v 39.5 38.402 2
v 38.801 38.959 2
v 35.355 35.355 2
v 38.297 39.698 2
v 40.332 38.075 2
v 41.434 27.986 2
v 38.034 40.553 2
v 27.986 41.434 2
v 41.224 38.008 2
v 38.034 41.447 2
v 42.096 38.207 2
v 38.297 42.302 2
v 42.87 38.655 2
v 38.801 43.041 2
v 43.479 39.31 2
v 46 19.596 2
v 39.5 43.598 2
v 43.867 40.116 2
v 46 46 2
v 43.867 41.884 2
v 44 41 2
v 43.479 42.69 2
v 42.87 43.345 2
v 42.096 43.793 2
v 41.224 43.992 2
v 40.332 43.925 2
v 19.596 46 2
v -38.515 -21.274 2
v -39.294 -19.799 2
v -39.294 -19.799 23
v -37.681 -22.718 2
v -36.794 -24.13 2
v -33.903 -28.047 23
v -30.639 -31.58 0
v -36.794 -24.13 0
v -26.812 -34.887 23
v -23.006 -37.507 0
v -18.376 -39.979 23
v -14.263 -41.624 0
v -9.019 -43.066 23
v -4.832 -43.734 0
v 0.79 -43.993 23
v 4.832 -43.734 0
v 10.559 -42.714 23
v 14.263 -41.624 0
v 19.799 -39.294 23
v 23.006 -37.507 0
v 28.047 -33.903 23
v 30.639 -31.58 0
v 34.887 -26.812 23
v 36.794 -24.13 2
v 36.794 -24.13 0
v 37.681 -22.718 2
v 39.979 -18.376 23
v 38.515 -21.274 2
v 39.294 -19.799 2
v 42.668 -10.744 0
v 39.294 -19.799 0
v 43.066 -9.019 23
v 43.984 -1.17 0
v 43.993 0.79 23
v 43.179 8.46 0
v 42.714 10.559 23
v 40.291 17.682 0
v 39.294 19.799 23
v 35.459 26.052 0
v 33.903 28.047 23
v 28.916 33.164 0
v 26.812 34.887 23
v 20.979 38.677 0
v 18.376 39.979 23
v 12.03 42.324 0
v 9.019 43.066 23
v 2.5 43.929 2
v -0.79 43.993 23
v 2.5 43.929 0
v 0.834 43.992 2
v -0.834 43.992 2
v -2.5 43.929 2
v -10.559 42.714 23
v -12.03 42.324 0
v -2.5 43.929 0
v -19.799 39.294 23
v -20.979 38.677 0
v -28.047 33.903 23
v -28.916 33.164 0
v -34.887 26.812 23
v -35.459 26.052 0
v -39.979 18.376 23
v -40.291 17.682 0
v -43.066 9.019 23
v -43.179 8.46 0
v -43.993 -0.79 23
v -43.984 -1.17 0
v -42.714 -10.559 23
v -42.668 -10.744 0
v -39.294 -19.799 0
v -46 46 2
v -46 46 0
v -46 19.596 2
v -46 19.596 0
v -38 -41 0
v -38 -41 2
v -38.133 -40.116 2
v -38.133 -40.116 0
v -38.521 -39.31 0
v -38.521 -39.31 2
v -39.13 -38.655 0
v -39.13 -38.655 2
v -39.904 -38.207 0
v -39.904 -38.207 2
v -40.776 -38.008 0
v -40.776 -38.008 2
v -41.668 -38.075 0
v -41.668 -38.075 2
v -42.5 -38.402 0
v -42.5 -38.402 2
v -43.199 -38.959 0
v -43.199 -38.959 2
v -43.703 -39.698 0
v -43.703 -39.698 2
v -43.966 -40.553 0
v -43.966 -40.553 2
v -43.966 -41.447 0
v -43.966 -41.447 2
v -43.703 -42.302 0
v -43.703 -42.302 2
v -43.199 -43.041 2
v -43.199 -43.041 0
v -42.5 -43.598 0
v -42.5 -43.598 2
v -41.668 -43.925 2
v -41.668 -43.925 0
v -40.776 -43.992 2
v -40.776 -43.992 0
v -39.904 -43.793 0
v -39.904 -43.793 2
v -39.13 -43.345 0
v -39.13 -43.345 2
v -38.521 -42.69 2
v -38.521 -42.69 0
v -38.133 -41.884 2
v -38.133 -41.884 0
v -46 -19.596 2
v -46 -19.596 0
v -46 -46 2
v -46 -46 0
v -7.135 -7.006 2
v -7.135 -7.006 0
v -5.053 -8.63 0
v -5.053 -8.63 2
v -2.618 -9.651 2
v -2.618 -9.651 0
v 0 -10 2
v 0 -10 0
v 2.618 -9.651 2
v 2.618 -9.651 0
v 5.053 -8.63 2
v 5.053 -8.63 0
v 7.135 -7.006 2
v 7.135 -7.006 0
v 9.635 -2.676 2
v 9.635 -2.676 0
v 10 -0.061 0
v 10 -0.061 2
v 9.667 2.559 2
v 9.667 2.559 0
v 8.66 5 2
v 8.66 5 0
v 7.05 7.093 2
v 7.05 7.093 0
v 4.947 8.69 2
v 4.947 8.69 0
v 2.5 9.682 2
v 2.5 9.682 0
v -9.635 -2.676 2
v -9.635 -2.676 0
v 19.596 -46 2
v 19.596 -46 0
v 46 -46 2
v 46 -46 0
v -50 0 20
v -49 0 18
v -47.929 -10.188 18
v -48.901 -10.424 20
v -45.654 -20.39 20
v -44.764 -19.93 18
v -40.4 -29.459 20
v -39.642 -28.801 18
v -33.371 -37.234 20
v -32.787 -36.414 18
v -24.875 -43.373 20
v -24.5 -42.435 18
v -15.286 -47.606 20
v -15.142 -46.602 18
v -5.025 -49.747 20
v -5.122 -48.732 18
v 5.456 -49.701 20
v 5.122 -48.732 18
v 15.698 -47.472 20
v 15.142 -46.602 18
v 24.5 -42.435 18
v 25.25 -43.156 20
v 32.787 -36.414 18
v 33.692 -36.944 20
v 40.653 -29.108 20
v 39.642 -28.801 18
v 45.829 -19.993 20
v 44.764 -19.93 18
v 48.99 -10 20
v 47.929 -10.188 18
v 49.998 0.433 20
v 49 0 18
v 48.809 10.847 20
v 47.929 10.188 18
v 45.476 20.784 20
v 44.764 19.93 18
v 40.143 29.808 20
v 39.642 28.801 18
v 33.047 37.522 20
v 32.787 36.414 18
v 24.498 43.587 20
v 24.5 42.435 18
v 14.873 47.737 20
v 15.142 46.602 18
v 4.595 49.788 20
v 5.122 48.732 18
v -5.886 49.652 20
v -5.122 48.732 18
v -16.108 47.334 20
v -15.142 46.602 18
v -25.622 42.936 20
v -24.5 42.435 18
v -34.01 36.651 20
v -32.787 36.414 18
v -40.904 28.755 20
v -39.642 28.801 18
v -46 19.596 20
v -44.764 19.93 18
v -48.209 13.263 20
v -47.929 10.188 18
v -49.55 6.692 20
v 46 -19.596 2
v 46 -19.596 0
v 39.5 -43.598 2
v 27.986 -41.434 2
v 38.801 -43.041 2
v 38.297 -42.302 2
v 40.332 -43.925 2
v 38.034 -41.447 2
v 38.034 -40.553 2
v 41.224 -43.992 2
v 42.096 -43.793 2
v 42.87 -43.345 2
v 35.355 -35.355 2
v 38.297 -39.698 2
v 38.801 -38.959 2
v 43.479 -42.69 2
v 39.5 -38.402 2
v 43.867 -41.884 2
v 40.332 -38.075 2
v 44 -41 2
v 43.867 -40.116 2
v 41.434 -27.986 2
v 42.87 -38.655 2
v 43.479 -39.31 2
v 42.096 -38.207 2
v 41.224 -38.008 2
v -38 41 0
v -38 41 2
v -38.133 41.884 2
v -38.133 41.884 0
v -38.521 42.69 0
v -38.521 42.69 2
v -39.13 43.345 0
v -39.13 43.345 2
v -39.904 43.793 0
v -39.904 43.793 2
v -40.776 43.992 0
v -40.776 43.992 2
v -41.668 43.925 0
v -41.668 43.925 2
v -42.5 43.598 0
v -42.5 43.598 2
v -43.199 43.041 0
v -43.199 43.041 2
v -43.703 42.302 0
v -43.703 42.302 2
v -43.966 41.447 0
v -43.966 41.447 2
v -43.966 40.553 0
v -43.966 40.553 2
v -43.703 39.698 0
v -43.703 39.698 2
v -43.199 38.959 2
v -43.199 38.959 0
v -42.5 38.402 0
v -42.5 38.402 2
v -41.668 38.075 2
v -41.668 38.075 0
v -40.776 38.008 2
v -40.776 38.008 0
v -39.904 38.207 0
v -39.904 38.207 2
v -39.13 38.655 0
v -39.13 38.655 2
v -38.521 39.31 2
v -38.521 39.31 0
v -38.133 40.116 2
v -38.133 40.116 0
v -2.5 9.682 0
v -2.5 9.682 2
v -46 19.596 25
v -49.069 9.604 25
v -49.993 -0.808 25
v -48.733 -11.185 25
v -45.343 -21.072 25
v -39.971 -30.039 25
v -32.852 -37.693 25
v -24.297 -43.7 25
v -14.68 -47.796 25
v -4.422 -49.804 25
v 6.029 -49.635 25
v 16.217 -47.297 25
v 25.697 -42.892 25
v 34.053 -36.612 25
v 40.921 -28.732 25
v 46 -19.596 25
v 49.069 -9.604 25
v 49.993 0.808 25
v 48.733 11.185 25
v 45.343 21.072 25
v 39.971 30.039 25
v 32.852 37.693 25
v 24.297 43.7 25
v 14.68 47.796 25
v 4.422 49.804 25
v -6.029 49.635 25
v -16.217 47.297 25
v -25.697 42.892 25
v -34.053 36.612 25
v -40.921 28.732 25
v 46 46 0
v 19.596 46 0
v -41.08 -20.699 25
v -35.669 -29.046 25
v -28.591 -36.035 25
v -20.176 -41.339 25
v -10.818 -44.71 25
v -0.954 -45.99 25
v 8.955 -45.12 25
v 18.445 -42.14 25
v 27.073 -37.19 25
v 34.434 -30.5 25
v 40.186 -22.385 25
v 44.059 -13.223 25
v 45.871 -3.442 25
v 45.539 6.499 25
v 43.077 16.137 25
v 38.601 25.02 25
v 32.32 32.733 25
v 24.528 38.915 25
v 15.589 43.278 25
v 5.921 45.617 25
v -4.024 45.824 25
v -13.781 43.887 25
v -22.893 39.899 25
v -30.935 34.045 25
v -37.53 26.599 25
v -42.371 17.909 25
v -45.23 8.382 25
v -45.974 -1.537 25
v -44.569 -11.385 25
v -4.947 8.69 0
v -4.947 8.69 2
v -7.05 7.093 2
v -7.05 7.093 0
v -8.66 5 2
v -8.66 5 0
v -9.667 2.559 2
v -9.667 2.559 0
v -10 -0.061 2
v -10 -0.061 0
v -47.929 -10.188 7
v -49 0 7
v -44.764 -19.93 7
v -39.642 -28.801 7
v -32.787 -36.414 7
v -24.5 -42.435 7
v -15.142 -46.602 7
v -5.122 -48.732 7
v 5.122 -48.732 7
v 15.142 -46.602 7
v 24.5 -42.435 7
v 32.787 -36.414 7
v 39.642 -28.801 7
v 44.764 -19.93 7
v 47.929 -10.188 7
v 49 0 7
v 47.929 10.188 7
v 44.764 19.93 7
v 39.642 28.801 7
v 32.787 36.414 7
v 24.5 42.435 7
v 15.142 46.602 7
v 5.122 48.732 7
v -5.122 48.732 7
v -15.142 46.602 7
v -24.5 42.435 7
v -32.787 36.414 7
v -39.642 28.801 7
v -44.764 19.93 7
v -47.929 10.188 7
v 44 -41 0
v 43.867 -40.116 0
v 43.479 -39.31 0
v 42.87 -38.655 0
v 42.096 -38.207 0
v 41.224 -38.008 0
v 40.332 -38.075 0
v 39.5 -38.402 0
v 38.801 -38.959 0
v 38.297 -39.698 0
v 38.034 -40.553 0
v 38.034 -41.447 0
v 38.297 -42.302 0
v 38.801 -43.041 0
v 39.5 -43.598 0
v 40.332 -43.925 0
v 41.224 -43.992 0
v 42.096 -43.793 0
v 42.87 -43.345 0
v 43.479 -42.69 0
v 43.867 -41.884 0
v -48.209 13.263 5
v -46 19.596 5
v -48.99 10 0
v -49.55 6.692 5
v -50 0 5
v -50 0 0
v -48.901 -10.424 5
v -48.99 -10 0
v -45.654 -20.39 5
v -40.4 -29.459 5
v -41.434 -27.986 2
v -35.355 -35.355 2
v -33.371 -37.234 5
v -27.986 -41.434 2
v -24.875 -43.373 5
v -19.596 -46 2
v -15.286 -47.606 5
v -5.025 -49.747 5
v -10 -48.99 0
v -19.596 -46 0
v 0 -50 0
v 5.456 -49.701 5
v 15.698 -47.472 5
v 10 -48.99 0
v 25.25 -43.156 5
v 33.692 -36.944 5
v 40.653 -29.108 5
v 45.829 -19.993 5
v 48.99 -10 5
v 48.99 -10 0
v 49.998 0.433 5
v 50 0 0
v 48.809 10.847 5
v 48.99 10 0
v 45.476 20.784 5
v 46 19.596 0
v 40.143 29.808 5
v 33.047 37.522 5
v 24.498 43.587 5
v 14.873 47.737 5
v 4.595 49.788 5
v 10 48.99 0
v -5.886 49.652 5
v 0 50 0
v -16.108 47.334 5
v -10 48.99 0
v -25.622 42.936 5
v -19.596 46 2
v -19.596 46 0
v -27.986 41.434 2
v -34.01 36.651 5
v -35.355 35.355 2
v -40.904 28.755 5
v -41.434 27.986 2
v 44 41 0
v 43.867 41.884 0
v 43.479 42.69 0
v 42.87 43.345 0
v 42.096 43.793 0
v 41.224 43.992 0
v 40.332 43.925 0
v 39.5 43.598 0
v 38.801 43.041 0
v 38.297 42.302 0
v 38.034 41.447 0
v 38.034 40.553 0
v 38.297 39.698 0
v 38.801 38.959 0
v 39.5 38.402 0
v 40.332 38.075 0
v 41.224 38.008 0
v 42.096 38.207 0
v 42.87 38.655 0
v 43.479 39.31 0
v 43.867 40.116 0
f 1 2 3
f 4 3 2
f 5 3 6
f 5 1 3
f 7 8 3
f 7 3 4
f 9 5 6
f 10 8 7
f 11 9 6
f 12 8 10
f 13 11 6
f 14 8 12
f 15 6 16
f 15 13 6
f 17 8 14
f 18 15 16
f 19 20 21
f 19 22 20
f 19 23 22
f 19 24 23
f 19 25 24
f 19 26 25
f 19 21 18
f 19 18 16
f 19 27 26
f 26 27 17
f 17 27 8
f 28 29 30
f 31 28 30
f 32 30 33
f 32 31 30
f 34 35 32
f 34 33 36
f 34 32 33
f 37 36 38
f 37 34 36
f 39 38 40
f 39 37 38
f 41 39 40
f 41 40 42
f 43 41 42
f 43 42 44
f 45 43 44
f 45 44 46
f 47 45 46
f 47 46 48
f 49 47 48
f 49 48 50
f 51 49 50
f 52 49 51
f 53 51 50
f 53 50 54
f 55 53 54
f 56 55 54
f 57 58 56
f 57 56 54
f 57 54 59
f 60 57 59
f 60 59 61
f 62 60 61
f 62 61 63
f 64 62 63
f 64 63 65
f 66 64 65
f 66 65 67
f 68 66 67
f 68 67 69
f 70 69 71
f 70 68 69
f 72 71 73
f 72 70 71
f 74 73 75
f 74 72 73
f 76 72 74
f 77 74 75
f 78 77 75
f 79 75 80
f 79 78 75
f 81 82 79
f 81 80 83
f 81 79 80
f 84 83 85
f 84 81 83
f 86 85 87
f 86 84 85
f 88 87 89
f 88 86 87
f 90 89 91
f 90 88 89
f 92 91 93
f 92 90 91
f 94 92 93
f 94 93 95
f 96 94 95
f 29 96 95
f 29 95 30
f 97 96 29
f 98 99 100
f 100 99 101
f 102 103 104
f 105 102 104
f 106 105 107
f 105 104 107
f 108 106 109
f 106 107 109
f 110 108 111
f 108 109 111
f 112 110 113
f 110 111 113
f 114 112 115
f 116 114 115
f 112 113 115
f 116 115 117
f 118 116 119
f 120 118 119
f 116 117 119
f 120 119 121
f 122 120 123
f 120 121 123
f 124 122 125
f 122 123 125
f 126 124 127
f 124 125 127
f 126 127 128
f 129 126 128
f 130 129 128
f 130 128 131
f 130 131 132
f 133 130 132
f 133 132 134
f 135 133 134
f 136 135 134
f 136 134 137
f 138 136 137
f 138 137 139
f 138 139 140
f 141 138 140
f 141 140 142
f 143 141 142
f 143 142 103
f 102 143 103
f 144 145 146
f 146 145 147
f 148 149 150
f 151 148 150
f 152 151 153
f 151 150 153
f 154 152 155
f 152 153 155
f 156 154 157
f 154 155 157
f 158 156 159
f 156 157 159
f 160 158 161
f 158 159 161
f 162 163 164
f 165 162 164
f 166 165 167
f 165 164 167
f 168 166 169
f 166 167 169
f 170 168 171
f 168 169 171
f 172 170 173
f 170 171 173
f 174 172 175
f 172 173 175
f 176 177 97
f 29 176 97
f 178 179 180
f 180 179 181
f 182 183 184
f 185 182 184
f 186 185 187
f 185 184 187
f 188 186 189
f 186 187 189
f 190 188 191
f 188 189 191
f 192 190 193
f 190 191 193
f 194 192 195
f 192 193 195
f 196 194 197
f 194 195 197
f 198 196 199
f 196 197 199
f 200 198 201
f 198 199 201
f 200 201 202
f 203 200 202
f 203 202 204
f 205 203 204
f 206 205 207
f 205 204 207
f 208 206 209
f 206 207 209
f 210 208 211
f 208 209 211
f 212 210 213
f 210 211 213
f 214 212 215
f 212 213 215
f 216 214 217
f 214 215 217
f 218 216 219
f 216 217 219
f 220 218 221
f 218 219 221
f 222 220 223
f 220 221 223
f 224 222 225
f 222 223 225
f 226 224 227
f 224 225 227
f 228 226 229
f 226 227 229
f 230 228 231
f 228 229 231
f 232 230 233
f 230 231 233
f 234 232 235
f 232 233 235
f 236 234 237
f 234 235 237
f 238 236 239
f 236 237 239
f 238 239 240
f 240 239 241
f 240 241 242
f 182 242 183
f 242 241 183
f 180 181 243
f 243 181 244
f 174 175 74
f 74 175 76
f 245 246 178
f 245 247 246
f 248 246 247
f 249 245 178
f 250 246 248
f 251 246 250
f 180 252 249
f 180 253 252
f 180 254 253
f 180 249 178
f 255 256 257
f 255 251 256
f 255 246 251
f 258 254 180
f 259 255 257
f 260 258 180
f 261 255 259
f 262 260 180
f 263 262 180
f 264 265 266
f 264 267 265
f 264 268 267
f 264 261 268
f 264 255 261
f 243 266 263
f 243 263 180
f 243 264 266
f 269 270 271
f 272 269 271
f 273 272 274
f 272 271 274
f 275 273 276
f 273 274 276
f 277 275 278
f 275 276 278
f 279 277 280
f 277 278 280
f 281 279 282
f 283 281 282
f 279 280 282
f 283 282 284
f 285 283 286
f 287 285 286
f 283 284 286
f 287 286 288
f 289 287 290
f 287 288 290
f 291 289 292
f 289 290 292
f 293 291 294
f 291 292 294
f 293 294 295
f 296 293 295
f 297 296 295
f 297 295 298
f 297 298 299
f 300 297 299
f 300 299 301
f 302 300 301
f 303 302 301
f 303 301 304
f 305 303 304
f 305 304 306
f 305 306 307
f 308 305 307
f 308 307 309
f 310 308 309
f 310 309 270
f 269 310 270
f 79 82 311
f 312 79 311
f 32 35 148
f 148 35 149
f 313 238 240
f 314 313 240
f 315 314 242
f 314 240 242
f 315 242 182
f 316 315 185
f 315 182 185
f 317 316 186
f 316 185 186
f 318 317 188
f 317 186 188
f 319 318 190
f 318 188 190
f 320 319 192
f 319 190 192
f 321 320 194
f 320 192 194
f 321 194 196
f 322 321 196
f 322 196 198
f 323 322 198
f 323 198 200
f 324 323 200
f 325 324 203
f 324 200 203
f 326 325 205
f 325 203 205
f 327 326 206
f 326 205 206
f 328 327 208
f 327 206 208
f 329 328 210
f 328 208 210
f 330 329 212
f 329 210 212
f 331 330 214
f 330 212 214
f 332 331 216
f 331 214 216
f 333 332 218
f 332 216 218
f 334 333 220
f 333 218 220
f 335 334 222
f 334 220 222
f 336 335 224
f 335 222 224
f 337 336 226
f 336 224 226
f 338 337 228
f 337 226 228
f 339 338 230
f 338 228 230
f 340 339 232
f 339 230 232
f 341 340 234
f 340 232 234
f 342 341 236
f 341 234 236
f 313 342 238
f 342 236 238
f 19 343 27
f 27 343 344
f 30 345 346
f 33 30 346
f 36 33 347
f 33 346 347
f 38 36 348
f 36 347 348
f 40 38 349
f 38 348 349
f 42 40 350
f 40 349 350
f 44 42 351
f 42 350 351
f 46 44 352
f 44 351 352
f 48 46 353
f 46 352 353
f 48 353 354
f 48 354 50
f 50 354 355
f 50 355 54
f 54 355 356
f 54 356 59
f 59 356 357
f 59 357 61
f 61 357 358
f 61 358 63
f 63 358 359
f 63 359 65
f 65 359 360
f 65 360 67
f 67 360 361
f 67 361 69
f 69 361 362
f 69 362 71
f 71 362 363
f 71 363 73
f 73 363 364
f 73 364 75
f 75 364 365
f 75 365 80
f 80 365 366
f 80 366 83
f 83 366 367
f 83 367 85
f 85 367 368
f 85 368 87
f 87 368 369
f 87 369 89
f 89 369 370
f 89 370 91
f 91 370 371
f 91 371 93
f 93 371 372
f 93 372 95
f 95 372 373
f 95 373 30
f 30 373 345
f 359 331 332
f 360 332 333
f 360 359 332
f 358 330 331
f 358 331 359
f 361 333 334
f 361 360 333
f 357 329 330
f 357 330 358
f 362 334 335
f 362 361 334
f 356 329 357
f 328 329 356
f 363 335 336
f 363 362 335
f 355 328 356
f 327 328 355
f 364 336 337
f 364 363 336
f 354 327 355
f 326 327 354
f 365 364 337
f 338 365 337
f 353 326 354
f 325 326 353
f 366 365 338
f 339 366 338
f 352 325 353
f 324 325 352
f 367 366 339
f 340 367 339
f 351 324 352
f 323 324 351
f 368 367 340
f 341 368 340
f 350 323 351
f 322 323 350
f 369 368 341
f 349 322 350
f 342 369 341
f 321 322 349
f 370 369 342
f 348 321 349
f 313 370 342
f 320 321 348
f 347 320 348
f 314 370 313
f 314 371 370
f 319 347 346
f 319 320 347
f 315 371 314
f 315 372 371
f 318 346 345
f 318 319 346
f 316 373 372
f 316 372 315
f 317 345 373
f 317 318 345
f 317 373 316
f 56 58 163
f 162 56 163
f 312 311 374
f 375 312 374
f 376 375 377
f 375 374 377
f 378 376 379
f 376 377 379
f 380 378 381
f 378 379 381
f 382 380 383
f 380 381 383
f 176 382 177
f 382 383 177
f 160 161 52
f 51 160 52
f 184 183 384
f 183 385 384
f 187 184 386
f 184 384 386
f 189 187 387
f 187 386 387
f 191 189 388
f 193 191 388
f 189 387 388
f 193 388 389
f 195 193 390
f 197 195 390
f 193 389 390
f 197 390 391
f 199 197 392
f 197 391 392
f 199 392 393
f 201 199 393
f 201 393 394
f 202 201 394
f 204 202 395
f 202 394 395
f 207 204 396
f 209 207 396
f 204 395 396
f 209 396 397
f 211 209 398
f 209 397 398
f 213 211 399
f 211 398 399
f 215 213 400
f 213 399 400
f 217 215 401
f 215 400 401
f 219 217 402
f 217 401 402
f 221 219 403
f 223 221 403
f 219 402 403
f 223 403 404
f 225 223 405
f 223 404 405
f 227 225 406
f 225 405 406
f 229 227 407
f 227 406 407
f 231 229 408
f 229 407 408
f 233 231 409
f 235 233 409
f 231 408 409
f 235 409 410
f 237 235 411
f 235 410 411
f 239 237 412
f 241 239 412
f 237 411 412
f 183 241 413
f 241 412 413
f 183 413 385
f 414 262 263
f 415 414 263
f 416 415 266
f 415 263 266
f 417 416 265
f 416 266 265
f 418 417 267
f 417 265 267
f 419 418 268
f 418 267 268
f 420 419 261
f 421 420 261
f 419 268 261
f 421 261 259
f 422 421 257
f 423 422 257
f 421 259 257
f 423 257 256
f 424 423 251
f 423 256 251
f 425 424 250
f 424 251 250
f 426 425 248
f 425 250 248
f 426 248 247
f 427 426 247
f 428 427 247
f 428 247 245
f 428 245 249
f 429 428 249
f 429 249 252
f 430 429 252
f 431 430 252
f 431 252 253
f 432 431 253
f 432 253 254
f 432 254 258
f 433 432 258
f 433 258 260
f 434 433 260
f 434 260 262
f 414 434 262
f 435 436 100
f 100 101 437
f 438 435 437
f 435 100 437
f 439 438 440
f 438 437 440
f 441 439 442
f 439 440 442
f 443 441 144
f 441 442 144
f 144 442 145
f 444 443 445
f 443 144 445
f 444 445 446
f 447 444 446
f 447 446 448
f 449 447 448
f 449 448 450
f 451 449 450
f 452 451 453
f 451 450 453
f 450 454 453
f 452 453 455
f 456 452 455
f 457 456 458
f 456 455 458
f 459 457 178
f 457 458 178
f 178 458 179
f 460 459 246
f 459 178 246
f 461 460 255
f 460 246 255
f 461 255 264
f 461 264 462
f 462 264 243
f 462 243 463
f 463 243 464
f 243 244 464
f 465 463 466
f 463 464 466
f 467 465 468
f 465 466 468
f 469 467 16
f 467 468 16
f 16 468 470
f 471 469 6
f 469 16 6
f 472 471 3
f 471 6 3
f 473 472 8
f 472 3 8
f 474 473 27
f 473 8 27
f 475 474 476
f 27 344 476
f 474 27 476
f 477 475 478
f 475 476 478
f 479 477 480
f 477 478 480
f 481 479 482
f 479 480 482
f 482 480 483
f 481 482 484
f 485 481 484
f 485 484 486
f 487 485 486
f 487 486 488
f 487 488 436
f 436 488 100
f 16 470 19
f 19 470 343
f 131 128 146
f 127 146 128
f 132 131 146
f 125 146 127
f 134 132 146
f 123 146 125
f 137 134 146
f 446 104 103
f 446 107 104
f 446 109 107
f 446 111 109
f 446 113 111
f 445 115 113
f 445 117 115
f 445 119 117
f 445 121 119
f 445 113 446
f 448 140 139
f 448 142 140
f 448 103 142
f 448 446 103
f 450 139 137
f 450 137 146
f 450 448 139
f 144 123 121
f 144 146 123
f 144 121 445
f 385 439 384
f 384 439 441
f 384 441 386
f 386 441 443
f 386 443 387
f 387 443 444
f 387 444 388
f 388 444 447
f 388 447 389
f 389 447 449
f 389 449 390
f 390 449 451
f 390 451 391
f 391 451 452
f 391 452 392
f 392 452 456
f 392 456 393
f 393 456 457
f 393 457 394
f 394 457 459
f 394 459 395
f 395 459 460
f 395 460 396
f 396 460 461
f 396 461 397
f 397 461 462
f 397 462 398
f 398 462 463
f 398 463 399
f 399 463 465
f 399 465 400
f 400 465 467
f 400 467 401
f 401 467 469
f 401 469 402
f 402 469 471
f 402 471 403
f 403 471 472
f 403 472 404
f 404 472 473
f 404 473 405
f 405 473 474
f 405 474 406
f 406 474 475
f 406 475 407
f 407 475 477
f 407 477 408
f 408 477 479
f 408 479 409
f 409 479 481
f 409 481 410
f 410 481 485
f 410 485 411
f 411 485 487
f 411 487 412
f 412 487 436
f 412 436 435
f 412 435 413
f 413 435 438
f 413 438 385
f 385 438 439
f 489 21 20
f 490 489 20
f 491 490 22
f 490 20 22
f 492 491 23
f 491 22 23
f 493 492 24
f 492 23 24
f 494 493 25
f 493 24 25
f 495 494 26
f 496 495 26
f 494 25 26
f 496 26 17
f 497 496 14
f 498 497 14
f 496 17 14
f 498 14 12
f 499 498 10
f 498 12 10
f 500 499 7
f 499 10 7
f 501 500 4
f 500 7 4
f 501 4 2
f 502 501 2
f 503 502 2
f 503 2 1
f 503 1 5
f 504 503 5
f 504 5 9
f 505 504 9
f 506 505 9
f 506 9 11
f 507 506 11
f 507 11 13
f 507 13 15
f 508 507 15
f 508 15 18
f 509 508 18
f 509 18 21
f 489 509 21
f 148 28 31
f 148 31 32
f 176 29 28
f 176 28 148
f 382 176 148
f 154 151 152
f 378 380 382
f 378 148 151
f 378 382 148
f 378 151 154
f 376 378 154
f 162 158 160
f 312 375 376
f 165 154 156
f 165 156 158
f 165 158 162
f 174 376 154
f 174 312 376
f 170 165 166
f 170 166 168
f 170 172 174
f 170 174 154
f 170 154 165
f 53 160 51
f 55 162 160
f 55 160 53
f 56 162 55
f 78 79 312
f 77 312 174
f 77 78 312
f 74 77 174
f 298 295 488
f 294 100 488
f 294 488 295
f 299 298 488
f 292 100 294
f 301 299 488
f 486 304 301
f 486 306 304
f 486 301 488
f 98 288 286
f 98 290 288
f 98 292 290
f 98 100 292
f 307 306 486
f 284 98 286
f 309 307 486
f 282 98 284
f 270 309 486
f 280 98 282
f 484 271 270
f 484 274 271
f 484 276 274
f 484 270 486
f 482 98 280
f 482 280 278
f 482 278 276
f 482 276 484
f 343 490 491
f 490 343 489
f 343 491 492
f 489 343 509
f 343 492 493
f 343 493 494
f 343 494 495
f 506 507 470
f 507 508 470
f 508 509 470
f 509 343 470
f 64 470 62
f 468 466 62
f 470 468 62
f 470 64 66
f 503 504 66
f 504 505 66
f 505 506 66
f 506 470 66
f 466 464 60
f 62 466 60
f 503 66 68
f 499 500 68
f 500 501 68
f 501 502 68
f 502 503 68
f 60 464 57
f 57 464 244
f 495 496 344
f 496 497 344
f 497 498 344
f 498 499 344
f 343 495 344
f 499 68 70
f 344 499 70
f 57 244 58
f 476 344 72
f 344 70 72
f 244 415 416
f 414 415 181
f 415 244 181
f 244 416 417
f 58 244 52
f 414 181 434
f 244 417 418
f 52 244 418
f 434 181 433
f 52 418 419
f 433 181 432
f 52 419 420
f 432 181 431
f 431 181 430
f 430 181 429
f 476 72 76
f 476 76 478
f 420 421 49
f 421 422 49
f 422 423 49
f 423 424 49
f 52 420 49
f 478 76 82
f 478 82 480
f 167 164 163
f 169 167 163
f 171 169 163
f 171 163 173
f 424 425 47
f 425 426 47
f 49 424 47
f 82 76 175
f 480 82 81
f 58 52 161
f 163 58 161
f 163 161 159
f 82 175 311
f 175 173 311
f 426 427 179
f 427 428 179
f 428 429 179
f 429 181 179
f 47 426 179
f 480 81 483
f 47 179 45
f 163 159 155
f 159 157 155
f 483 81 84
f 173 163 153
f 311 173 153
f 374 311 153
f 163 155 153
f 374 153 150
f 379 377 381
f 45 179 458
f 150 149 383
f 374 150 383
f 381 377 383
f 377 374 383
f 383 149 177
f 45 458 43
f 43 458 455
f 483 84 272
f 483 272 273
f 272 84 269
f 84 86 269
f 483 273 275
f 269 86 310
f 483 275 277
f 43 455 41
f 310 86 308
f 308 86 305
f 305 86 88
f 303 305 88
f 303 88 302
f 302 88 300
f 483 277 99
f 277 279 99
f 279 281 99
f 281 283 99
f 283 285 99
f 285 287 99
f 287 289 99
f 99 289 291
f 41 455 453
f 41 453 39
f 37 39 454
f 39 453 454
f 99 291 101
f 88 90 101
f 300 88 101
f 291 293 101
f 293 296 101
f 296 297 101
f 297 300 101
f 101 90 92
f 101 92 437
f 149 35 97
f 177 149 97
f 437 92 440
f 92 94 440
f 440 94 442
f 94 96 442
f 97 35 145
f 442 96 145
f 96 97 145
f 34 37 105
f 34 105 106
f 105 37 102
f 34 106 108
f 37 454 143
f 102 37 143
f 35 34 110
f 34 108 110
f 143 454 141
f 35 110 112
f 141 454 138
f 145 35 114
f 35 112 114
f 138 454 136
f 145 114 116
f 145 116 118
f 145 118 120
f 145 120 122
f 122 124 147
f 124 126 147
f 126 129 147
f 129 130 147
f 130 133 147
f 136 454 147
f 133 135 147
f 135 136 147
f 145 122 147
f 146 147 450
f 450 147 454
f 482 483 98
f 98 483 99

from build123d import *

# Parameters (mm, degrees)
SALIENTE_EXTRUIR2_DEPTH   = 2
SALIENTE_EXTRUIR2_2_DEPTH = 2
SALIENTE_EXTRUIR2_3_DEPTH = 2
SALIENTE_EXTRUIR2_4_DEPTH = 2
SALIENTE_EXTRUIR2_5_DEPTH = 2
SALIENTE_EXTRUIR3_DEPTH   = 25
CHAFL_N1_SIZE             = 2
CROQUIS3_R                = 3
CORTAR_EXTRUIR1_DEPTH     = 25


with BuildPart() as part:
    # Croquis1 → Saliente-Extruir2 (new body)
    with BuildSketch(Plane.XY):
        with BuildLine():
            ThreePointArc((-19.595917942, -46), (-35.355339059, -35.355339059), (-46, -19.595917942))
            Line((-46, -19.595917942), (-46, -46))
            Line((-46, -46), (-19.595917942, -46))
        make_face()
    extrude(amount=SALIENTE_EXTRUIR2_DEPTH)



with BuildPart() as body_2:
    # Croquis1 → Saliente-Extruir2 2 (new body)
    with BuildSketch(Plane.XY):
        with BuildLine():
            Line((-46, 46), (-46, 19.595917942))
            ThreePointArc((-46, 19.595917942), (-35.355339059, 35.355339059), (-19.595917942, 46))
            Line((-19.595917942, 46), (-46, 46))
        make_face()
    extrude(amount=SALIENTE_EXTRUIR2_2_DEPTH)


with BuildPart() as body_3:
    # Croquis1 → Saliente-Extruir2 3 (new body)
    with BuildSketch(Plane.XY):
        with BuildLine():
            ThreePointArc((46, -19.595917942), (35.355339059, -35.355339059), (19.595917942, -46))
            Line((19.595917942, -46), (46, -46))
            Line((46, -46), (46, -19.595917942))
        make_face()
    extrude(amount=SALIENTE_EXTRUIR2_3_DEPTH)


with BuildPart() as body_4:
    # Croquis1 → Saliente-Extruir2 4 (new body)
    with BuildSketch(Plane.XY):
        with BuildLine():
            Line((46, 46), (19.595917942, 46))
            ThreePointArc((19.595917942, 46), (35.355339059, 35.355339059), (46, 19.595917942))
            Line((46, 19.595917942), (46, 46))
        make_face()
    extrude(amount=SALIENTE_EXTRUIR2_4_DEPTH)


with BuildPart() as body_5:
    # Croquis1 → Saliente-Extruir2 5 (new body)
    with BuildSketch(Plane.XY):
        with BuildLine():
            Line((-2.5, 43.928919859), (-2.5, 9.682458366))
            ThreePointArc((-2.5, 9.682458366), (-8.660254038, 5), (-9.635254916, -2.676165673))
            Line((-9.635254916, -2.676165673), (-39.293560559, -19.79939642))
            ThreePointArc((-39.293560559, -19.79939642), (-38.105117767, -22), (-36.793560559, -24.129523439))
            Line((-36.793560559, -24.129523439), (-7.135254916, -7.006292692))
            ThreePointArc((-7.135254916, -7.006292692), (0, -10), (7.135254916, -7.006292692))
            Line((7.135254916, -7.006292692), (36.793560559, -24.129523439))
            ThreePointArc((36.793560559, -24.129523439), (38.105117767, -22), (39.293560559, -19.79939642))
            Line((39.293560559, -19.79939642), (9.635254916, -2.676165673))
            ThreePointArc((9.635254916, -2.676165673), (8.660254038, 5), (2.5, 9.682458366))
            Line((2.5, 9.682458366), (2.5, 43.928919859))
            ThreePointArc((2.5, 43.928919859), (0, 44), (-2.5, 43.928919859))
        make_face()
    extrude(amount=SALIENTE_EXTRUIR2_5_DEPTH)


with BuildPart() as part_1:
    add(part.part)

    add(body_2.part)  # Saliente-Extruir3 merges body 2

    add(body_3.part)  # Saliente-Extruir3 merges body 3

    add(body_4.part)  # Saliente-Extruir3 merges body 4

    add(body_5.part)  # Saliente-Extruir3 merges body 5
    # Croquis1<5> → Saliente-Extruir3 (add)
    with BuildSketch(Plane.XY):
        with BuildLine():
            ThreePointArc((-46, 19.595917942), (-50, 0), (-46, -19.595917942))
            ThreePointArc((-46, -19.595917942), (-35.355339059, -35.355339059), (-19.595917942, -46))
            ThreePointArc((-19.595917942, -46), (0, -50), (19.595917942, -46))
            ThreePointArc((19.595917942, -46), (35.355339059, -35.355339059), (46, -19.595917942))
            ThreePointArc((46, -19.595917942), (48.989794856, -10), (50, 0))
            ThreePointArc((50, 0), (48.989794856, 10), (46, 19.595917942))
            ThreePointArc((46, 19.595917942), (35.355339059, 35.355339059), (19.595917942, 46))
            ThreePointArc((19.595917942, 46), (0, 50), (-19.595917942, 46))
            ThreePointArc((-19.595917942, 46), (-35.355339059, 35.355339059), (-46, 19.595917942))
        make_face()
        with BuildLine():
            ThreePointArc((-39.293560559, -19.79939642), (-38.105117767, 22), (-2.5, 43.928919859))
            ThreePointArc((-2.5, 43.928919859), (0, 44), (2.5, 43.928919859))
            ThreePointArc((2.5, 43.928919859), (31.984371183, 30.215889859), (44, 0))
            ThreePointArc((44, 0), (42.807222899, -10.175542625), (39.293560559, -19.79939642))
            ThreePointArc((39.293560559, -19.79939642), (38.105117767, -22), (36.793560559, -24.129523439))
            ThreePointArc((36.793560559, -24.129523439), (0, -44), (-36.793560559, -24.129523439))
            ThreePointArc((-36.793560559, -24.129523439), (-38.105117767, -22), (-39.293560559, -19.79939642))
        make_face(mode=Mode.SUBTRACT)
    extrude(amount=SALIENTE_EXTRUIR3_DEPTH)

    # Croquis2 → Cortar-Revolución1 (revolve, cut)
    with BuildSketch(Plane(origin=(0, 0, 0), x_dir=(0, 0, -1), z_dir=(1, 0, 0))):
        Polygon((-5, 50), (-20, 50), (-18, 49), (-7, 49), align=None)
    revolve(axis=Axis((0, 0, -1.25), (0, 0, 1)), mode=Mode.SUBTRACT)

    # Chaflán1
    chafl_n1_edges = [part_1.edges().sort_by_distance(p)[0] for p in [
        (36.793560559, 24.129523439, 25),
    ]]
    chamfer(chafl_n1_edges, length=CHAFL_N1_SIZE)

    # Croquis3 → Cortar-Extruir1 (cut)
    with BuildSketch(Plane.XY.offset(2)):
        with Locations((-41, 41)):
            Circle(CROQUIS3_R)
        with Locations((-41, -41)):
            Circle(CROQUIS3_R)
        with Locations((41, 41)):
            Circle(CROQUIS3_R)
        with Locations((41, -41)):
            Circle(CROQUIS3_R)
    extrude(amount=-CORTAR_EXTRUIR1_DEPTH, mode=Mode.SUBTRACT)


solid = part_1.part
